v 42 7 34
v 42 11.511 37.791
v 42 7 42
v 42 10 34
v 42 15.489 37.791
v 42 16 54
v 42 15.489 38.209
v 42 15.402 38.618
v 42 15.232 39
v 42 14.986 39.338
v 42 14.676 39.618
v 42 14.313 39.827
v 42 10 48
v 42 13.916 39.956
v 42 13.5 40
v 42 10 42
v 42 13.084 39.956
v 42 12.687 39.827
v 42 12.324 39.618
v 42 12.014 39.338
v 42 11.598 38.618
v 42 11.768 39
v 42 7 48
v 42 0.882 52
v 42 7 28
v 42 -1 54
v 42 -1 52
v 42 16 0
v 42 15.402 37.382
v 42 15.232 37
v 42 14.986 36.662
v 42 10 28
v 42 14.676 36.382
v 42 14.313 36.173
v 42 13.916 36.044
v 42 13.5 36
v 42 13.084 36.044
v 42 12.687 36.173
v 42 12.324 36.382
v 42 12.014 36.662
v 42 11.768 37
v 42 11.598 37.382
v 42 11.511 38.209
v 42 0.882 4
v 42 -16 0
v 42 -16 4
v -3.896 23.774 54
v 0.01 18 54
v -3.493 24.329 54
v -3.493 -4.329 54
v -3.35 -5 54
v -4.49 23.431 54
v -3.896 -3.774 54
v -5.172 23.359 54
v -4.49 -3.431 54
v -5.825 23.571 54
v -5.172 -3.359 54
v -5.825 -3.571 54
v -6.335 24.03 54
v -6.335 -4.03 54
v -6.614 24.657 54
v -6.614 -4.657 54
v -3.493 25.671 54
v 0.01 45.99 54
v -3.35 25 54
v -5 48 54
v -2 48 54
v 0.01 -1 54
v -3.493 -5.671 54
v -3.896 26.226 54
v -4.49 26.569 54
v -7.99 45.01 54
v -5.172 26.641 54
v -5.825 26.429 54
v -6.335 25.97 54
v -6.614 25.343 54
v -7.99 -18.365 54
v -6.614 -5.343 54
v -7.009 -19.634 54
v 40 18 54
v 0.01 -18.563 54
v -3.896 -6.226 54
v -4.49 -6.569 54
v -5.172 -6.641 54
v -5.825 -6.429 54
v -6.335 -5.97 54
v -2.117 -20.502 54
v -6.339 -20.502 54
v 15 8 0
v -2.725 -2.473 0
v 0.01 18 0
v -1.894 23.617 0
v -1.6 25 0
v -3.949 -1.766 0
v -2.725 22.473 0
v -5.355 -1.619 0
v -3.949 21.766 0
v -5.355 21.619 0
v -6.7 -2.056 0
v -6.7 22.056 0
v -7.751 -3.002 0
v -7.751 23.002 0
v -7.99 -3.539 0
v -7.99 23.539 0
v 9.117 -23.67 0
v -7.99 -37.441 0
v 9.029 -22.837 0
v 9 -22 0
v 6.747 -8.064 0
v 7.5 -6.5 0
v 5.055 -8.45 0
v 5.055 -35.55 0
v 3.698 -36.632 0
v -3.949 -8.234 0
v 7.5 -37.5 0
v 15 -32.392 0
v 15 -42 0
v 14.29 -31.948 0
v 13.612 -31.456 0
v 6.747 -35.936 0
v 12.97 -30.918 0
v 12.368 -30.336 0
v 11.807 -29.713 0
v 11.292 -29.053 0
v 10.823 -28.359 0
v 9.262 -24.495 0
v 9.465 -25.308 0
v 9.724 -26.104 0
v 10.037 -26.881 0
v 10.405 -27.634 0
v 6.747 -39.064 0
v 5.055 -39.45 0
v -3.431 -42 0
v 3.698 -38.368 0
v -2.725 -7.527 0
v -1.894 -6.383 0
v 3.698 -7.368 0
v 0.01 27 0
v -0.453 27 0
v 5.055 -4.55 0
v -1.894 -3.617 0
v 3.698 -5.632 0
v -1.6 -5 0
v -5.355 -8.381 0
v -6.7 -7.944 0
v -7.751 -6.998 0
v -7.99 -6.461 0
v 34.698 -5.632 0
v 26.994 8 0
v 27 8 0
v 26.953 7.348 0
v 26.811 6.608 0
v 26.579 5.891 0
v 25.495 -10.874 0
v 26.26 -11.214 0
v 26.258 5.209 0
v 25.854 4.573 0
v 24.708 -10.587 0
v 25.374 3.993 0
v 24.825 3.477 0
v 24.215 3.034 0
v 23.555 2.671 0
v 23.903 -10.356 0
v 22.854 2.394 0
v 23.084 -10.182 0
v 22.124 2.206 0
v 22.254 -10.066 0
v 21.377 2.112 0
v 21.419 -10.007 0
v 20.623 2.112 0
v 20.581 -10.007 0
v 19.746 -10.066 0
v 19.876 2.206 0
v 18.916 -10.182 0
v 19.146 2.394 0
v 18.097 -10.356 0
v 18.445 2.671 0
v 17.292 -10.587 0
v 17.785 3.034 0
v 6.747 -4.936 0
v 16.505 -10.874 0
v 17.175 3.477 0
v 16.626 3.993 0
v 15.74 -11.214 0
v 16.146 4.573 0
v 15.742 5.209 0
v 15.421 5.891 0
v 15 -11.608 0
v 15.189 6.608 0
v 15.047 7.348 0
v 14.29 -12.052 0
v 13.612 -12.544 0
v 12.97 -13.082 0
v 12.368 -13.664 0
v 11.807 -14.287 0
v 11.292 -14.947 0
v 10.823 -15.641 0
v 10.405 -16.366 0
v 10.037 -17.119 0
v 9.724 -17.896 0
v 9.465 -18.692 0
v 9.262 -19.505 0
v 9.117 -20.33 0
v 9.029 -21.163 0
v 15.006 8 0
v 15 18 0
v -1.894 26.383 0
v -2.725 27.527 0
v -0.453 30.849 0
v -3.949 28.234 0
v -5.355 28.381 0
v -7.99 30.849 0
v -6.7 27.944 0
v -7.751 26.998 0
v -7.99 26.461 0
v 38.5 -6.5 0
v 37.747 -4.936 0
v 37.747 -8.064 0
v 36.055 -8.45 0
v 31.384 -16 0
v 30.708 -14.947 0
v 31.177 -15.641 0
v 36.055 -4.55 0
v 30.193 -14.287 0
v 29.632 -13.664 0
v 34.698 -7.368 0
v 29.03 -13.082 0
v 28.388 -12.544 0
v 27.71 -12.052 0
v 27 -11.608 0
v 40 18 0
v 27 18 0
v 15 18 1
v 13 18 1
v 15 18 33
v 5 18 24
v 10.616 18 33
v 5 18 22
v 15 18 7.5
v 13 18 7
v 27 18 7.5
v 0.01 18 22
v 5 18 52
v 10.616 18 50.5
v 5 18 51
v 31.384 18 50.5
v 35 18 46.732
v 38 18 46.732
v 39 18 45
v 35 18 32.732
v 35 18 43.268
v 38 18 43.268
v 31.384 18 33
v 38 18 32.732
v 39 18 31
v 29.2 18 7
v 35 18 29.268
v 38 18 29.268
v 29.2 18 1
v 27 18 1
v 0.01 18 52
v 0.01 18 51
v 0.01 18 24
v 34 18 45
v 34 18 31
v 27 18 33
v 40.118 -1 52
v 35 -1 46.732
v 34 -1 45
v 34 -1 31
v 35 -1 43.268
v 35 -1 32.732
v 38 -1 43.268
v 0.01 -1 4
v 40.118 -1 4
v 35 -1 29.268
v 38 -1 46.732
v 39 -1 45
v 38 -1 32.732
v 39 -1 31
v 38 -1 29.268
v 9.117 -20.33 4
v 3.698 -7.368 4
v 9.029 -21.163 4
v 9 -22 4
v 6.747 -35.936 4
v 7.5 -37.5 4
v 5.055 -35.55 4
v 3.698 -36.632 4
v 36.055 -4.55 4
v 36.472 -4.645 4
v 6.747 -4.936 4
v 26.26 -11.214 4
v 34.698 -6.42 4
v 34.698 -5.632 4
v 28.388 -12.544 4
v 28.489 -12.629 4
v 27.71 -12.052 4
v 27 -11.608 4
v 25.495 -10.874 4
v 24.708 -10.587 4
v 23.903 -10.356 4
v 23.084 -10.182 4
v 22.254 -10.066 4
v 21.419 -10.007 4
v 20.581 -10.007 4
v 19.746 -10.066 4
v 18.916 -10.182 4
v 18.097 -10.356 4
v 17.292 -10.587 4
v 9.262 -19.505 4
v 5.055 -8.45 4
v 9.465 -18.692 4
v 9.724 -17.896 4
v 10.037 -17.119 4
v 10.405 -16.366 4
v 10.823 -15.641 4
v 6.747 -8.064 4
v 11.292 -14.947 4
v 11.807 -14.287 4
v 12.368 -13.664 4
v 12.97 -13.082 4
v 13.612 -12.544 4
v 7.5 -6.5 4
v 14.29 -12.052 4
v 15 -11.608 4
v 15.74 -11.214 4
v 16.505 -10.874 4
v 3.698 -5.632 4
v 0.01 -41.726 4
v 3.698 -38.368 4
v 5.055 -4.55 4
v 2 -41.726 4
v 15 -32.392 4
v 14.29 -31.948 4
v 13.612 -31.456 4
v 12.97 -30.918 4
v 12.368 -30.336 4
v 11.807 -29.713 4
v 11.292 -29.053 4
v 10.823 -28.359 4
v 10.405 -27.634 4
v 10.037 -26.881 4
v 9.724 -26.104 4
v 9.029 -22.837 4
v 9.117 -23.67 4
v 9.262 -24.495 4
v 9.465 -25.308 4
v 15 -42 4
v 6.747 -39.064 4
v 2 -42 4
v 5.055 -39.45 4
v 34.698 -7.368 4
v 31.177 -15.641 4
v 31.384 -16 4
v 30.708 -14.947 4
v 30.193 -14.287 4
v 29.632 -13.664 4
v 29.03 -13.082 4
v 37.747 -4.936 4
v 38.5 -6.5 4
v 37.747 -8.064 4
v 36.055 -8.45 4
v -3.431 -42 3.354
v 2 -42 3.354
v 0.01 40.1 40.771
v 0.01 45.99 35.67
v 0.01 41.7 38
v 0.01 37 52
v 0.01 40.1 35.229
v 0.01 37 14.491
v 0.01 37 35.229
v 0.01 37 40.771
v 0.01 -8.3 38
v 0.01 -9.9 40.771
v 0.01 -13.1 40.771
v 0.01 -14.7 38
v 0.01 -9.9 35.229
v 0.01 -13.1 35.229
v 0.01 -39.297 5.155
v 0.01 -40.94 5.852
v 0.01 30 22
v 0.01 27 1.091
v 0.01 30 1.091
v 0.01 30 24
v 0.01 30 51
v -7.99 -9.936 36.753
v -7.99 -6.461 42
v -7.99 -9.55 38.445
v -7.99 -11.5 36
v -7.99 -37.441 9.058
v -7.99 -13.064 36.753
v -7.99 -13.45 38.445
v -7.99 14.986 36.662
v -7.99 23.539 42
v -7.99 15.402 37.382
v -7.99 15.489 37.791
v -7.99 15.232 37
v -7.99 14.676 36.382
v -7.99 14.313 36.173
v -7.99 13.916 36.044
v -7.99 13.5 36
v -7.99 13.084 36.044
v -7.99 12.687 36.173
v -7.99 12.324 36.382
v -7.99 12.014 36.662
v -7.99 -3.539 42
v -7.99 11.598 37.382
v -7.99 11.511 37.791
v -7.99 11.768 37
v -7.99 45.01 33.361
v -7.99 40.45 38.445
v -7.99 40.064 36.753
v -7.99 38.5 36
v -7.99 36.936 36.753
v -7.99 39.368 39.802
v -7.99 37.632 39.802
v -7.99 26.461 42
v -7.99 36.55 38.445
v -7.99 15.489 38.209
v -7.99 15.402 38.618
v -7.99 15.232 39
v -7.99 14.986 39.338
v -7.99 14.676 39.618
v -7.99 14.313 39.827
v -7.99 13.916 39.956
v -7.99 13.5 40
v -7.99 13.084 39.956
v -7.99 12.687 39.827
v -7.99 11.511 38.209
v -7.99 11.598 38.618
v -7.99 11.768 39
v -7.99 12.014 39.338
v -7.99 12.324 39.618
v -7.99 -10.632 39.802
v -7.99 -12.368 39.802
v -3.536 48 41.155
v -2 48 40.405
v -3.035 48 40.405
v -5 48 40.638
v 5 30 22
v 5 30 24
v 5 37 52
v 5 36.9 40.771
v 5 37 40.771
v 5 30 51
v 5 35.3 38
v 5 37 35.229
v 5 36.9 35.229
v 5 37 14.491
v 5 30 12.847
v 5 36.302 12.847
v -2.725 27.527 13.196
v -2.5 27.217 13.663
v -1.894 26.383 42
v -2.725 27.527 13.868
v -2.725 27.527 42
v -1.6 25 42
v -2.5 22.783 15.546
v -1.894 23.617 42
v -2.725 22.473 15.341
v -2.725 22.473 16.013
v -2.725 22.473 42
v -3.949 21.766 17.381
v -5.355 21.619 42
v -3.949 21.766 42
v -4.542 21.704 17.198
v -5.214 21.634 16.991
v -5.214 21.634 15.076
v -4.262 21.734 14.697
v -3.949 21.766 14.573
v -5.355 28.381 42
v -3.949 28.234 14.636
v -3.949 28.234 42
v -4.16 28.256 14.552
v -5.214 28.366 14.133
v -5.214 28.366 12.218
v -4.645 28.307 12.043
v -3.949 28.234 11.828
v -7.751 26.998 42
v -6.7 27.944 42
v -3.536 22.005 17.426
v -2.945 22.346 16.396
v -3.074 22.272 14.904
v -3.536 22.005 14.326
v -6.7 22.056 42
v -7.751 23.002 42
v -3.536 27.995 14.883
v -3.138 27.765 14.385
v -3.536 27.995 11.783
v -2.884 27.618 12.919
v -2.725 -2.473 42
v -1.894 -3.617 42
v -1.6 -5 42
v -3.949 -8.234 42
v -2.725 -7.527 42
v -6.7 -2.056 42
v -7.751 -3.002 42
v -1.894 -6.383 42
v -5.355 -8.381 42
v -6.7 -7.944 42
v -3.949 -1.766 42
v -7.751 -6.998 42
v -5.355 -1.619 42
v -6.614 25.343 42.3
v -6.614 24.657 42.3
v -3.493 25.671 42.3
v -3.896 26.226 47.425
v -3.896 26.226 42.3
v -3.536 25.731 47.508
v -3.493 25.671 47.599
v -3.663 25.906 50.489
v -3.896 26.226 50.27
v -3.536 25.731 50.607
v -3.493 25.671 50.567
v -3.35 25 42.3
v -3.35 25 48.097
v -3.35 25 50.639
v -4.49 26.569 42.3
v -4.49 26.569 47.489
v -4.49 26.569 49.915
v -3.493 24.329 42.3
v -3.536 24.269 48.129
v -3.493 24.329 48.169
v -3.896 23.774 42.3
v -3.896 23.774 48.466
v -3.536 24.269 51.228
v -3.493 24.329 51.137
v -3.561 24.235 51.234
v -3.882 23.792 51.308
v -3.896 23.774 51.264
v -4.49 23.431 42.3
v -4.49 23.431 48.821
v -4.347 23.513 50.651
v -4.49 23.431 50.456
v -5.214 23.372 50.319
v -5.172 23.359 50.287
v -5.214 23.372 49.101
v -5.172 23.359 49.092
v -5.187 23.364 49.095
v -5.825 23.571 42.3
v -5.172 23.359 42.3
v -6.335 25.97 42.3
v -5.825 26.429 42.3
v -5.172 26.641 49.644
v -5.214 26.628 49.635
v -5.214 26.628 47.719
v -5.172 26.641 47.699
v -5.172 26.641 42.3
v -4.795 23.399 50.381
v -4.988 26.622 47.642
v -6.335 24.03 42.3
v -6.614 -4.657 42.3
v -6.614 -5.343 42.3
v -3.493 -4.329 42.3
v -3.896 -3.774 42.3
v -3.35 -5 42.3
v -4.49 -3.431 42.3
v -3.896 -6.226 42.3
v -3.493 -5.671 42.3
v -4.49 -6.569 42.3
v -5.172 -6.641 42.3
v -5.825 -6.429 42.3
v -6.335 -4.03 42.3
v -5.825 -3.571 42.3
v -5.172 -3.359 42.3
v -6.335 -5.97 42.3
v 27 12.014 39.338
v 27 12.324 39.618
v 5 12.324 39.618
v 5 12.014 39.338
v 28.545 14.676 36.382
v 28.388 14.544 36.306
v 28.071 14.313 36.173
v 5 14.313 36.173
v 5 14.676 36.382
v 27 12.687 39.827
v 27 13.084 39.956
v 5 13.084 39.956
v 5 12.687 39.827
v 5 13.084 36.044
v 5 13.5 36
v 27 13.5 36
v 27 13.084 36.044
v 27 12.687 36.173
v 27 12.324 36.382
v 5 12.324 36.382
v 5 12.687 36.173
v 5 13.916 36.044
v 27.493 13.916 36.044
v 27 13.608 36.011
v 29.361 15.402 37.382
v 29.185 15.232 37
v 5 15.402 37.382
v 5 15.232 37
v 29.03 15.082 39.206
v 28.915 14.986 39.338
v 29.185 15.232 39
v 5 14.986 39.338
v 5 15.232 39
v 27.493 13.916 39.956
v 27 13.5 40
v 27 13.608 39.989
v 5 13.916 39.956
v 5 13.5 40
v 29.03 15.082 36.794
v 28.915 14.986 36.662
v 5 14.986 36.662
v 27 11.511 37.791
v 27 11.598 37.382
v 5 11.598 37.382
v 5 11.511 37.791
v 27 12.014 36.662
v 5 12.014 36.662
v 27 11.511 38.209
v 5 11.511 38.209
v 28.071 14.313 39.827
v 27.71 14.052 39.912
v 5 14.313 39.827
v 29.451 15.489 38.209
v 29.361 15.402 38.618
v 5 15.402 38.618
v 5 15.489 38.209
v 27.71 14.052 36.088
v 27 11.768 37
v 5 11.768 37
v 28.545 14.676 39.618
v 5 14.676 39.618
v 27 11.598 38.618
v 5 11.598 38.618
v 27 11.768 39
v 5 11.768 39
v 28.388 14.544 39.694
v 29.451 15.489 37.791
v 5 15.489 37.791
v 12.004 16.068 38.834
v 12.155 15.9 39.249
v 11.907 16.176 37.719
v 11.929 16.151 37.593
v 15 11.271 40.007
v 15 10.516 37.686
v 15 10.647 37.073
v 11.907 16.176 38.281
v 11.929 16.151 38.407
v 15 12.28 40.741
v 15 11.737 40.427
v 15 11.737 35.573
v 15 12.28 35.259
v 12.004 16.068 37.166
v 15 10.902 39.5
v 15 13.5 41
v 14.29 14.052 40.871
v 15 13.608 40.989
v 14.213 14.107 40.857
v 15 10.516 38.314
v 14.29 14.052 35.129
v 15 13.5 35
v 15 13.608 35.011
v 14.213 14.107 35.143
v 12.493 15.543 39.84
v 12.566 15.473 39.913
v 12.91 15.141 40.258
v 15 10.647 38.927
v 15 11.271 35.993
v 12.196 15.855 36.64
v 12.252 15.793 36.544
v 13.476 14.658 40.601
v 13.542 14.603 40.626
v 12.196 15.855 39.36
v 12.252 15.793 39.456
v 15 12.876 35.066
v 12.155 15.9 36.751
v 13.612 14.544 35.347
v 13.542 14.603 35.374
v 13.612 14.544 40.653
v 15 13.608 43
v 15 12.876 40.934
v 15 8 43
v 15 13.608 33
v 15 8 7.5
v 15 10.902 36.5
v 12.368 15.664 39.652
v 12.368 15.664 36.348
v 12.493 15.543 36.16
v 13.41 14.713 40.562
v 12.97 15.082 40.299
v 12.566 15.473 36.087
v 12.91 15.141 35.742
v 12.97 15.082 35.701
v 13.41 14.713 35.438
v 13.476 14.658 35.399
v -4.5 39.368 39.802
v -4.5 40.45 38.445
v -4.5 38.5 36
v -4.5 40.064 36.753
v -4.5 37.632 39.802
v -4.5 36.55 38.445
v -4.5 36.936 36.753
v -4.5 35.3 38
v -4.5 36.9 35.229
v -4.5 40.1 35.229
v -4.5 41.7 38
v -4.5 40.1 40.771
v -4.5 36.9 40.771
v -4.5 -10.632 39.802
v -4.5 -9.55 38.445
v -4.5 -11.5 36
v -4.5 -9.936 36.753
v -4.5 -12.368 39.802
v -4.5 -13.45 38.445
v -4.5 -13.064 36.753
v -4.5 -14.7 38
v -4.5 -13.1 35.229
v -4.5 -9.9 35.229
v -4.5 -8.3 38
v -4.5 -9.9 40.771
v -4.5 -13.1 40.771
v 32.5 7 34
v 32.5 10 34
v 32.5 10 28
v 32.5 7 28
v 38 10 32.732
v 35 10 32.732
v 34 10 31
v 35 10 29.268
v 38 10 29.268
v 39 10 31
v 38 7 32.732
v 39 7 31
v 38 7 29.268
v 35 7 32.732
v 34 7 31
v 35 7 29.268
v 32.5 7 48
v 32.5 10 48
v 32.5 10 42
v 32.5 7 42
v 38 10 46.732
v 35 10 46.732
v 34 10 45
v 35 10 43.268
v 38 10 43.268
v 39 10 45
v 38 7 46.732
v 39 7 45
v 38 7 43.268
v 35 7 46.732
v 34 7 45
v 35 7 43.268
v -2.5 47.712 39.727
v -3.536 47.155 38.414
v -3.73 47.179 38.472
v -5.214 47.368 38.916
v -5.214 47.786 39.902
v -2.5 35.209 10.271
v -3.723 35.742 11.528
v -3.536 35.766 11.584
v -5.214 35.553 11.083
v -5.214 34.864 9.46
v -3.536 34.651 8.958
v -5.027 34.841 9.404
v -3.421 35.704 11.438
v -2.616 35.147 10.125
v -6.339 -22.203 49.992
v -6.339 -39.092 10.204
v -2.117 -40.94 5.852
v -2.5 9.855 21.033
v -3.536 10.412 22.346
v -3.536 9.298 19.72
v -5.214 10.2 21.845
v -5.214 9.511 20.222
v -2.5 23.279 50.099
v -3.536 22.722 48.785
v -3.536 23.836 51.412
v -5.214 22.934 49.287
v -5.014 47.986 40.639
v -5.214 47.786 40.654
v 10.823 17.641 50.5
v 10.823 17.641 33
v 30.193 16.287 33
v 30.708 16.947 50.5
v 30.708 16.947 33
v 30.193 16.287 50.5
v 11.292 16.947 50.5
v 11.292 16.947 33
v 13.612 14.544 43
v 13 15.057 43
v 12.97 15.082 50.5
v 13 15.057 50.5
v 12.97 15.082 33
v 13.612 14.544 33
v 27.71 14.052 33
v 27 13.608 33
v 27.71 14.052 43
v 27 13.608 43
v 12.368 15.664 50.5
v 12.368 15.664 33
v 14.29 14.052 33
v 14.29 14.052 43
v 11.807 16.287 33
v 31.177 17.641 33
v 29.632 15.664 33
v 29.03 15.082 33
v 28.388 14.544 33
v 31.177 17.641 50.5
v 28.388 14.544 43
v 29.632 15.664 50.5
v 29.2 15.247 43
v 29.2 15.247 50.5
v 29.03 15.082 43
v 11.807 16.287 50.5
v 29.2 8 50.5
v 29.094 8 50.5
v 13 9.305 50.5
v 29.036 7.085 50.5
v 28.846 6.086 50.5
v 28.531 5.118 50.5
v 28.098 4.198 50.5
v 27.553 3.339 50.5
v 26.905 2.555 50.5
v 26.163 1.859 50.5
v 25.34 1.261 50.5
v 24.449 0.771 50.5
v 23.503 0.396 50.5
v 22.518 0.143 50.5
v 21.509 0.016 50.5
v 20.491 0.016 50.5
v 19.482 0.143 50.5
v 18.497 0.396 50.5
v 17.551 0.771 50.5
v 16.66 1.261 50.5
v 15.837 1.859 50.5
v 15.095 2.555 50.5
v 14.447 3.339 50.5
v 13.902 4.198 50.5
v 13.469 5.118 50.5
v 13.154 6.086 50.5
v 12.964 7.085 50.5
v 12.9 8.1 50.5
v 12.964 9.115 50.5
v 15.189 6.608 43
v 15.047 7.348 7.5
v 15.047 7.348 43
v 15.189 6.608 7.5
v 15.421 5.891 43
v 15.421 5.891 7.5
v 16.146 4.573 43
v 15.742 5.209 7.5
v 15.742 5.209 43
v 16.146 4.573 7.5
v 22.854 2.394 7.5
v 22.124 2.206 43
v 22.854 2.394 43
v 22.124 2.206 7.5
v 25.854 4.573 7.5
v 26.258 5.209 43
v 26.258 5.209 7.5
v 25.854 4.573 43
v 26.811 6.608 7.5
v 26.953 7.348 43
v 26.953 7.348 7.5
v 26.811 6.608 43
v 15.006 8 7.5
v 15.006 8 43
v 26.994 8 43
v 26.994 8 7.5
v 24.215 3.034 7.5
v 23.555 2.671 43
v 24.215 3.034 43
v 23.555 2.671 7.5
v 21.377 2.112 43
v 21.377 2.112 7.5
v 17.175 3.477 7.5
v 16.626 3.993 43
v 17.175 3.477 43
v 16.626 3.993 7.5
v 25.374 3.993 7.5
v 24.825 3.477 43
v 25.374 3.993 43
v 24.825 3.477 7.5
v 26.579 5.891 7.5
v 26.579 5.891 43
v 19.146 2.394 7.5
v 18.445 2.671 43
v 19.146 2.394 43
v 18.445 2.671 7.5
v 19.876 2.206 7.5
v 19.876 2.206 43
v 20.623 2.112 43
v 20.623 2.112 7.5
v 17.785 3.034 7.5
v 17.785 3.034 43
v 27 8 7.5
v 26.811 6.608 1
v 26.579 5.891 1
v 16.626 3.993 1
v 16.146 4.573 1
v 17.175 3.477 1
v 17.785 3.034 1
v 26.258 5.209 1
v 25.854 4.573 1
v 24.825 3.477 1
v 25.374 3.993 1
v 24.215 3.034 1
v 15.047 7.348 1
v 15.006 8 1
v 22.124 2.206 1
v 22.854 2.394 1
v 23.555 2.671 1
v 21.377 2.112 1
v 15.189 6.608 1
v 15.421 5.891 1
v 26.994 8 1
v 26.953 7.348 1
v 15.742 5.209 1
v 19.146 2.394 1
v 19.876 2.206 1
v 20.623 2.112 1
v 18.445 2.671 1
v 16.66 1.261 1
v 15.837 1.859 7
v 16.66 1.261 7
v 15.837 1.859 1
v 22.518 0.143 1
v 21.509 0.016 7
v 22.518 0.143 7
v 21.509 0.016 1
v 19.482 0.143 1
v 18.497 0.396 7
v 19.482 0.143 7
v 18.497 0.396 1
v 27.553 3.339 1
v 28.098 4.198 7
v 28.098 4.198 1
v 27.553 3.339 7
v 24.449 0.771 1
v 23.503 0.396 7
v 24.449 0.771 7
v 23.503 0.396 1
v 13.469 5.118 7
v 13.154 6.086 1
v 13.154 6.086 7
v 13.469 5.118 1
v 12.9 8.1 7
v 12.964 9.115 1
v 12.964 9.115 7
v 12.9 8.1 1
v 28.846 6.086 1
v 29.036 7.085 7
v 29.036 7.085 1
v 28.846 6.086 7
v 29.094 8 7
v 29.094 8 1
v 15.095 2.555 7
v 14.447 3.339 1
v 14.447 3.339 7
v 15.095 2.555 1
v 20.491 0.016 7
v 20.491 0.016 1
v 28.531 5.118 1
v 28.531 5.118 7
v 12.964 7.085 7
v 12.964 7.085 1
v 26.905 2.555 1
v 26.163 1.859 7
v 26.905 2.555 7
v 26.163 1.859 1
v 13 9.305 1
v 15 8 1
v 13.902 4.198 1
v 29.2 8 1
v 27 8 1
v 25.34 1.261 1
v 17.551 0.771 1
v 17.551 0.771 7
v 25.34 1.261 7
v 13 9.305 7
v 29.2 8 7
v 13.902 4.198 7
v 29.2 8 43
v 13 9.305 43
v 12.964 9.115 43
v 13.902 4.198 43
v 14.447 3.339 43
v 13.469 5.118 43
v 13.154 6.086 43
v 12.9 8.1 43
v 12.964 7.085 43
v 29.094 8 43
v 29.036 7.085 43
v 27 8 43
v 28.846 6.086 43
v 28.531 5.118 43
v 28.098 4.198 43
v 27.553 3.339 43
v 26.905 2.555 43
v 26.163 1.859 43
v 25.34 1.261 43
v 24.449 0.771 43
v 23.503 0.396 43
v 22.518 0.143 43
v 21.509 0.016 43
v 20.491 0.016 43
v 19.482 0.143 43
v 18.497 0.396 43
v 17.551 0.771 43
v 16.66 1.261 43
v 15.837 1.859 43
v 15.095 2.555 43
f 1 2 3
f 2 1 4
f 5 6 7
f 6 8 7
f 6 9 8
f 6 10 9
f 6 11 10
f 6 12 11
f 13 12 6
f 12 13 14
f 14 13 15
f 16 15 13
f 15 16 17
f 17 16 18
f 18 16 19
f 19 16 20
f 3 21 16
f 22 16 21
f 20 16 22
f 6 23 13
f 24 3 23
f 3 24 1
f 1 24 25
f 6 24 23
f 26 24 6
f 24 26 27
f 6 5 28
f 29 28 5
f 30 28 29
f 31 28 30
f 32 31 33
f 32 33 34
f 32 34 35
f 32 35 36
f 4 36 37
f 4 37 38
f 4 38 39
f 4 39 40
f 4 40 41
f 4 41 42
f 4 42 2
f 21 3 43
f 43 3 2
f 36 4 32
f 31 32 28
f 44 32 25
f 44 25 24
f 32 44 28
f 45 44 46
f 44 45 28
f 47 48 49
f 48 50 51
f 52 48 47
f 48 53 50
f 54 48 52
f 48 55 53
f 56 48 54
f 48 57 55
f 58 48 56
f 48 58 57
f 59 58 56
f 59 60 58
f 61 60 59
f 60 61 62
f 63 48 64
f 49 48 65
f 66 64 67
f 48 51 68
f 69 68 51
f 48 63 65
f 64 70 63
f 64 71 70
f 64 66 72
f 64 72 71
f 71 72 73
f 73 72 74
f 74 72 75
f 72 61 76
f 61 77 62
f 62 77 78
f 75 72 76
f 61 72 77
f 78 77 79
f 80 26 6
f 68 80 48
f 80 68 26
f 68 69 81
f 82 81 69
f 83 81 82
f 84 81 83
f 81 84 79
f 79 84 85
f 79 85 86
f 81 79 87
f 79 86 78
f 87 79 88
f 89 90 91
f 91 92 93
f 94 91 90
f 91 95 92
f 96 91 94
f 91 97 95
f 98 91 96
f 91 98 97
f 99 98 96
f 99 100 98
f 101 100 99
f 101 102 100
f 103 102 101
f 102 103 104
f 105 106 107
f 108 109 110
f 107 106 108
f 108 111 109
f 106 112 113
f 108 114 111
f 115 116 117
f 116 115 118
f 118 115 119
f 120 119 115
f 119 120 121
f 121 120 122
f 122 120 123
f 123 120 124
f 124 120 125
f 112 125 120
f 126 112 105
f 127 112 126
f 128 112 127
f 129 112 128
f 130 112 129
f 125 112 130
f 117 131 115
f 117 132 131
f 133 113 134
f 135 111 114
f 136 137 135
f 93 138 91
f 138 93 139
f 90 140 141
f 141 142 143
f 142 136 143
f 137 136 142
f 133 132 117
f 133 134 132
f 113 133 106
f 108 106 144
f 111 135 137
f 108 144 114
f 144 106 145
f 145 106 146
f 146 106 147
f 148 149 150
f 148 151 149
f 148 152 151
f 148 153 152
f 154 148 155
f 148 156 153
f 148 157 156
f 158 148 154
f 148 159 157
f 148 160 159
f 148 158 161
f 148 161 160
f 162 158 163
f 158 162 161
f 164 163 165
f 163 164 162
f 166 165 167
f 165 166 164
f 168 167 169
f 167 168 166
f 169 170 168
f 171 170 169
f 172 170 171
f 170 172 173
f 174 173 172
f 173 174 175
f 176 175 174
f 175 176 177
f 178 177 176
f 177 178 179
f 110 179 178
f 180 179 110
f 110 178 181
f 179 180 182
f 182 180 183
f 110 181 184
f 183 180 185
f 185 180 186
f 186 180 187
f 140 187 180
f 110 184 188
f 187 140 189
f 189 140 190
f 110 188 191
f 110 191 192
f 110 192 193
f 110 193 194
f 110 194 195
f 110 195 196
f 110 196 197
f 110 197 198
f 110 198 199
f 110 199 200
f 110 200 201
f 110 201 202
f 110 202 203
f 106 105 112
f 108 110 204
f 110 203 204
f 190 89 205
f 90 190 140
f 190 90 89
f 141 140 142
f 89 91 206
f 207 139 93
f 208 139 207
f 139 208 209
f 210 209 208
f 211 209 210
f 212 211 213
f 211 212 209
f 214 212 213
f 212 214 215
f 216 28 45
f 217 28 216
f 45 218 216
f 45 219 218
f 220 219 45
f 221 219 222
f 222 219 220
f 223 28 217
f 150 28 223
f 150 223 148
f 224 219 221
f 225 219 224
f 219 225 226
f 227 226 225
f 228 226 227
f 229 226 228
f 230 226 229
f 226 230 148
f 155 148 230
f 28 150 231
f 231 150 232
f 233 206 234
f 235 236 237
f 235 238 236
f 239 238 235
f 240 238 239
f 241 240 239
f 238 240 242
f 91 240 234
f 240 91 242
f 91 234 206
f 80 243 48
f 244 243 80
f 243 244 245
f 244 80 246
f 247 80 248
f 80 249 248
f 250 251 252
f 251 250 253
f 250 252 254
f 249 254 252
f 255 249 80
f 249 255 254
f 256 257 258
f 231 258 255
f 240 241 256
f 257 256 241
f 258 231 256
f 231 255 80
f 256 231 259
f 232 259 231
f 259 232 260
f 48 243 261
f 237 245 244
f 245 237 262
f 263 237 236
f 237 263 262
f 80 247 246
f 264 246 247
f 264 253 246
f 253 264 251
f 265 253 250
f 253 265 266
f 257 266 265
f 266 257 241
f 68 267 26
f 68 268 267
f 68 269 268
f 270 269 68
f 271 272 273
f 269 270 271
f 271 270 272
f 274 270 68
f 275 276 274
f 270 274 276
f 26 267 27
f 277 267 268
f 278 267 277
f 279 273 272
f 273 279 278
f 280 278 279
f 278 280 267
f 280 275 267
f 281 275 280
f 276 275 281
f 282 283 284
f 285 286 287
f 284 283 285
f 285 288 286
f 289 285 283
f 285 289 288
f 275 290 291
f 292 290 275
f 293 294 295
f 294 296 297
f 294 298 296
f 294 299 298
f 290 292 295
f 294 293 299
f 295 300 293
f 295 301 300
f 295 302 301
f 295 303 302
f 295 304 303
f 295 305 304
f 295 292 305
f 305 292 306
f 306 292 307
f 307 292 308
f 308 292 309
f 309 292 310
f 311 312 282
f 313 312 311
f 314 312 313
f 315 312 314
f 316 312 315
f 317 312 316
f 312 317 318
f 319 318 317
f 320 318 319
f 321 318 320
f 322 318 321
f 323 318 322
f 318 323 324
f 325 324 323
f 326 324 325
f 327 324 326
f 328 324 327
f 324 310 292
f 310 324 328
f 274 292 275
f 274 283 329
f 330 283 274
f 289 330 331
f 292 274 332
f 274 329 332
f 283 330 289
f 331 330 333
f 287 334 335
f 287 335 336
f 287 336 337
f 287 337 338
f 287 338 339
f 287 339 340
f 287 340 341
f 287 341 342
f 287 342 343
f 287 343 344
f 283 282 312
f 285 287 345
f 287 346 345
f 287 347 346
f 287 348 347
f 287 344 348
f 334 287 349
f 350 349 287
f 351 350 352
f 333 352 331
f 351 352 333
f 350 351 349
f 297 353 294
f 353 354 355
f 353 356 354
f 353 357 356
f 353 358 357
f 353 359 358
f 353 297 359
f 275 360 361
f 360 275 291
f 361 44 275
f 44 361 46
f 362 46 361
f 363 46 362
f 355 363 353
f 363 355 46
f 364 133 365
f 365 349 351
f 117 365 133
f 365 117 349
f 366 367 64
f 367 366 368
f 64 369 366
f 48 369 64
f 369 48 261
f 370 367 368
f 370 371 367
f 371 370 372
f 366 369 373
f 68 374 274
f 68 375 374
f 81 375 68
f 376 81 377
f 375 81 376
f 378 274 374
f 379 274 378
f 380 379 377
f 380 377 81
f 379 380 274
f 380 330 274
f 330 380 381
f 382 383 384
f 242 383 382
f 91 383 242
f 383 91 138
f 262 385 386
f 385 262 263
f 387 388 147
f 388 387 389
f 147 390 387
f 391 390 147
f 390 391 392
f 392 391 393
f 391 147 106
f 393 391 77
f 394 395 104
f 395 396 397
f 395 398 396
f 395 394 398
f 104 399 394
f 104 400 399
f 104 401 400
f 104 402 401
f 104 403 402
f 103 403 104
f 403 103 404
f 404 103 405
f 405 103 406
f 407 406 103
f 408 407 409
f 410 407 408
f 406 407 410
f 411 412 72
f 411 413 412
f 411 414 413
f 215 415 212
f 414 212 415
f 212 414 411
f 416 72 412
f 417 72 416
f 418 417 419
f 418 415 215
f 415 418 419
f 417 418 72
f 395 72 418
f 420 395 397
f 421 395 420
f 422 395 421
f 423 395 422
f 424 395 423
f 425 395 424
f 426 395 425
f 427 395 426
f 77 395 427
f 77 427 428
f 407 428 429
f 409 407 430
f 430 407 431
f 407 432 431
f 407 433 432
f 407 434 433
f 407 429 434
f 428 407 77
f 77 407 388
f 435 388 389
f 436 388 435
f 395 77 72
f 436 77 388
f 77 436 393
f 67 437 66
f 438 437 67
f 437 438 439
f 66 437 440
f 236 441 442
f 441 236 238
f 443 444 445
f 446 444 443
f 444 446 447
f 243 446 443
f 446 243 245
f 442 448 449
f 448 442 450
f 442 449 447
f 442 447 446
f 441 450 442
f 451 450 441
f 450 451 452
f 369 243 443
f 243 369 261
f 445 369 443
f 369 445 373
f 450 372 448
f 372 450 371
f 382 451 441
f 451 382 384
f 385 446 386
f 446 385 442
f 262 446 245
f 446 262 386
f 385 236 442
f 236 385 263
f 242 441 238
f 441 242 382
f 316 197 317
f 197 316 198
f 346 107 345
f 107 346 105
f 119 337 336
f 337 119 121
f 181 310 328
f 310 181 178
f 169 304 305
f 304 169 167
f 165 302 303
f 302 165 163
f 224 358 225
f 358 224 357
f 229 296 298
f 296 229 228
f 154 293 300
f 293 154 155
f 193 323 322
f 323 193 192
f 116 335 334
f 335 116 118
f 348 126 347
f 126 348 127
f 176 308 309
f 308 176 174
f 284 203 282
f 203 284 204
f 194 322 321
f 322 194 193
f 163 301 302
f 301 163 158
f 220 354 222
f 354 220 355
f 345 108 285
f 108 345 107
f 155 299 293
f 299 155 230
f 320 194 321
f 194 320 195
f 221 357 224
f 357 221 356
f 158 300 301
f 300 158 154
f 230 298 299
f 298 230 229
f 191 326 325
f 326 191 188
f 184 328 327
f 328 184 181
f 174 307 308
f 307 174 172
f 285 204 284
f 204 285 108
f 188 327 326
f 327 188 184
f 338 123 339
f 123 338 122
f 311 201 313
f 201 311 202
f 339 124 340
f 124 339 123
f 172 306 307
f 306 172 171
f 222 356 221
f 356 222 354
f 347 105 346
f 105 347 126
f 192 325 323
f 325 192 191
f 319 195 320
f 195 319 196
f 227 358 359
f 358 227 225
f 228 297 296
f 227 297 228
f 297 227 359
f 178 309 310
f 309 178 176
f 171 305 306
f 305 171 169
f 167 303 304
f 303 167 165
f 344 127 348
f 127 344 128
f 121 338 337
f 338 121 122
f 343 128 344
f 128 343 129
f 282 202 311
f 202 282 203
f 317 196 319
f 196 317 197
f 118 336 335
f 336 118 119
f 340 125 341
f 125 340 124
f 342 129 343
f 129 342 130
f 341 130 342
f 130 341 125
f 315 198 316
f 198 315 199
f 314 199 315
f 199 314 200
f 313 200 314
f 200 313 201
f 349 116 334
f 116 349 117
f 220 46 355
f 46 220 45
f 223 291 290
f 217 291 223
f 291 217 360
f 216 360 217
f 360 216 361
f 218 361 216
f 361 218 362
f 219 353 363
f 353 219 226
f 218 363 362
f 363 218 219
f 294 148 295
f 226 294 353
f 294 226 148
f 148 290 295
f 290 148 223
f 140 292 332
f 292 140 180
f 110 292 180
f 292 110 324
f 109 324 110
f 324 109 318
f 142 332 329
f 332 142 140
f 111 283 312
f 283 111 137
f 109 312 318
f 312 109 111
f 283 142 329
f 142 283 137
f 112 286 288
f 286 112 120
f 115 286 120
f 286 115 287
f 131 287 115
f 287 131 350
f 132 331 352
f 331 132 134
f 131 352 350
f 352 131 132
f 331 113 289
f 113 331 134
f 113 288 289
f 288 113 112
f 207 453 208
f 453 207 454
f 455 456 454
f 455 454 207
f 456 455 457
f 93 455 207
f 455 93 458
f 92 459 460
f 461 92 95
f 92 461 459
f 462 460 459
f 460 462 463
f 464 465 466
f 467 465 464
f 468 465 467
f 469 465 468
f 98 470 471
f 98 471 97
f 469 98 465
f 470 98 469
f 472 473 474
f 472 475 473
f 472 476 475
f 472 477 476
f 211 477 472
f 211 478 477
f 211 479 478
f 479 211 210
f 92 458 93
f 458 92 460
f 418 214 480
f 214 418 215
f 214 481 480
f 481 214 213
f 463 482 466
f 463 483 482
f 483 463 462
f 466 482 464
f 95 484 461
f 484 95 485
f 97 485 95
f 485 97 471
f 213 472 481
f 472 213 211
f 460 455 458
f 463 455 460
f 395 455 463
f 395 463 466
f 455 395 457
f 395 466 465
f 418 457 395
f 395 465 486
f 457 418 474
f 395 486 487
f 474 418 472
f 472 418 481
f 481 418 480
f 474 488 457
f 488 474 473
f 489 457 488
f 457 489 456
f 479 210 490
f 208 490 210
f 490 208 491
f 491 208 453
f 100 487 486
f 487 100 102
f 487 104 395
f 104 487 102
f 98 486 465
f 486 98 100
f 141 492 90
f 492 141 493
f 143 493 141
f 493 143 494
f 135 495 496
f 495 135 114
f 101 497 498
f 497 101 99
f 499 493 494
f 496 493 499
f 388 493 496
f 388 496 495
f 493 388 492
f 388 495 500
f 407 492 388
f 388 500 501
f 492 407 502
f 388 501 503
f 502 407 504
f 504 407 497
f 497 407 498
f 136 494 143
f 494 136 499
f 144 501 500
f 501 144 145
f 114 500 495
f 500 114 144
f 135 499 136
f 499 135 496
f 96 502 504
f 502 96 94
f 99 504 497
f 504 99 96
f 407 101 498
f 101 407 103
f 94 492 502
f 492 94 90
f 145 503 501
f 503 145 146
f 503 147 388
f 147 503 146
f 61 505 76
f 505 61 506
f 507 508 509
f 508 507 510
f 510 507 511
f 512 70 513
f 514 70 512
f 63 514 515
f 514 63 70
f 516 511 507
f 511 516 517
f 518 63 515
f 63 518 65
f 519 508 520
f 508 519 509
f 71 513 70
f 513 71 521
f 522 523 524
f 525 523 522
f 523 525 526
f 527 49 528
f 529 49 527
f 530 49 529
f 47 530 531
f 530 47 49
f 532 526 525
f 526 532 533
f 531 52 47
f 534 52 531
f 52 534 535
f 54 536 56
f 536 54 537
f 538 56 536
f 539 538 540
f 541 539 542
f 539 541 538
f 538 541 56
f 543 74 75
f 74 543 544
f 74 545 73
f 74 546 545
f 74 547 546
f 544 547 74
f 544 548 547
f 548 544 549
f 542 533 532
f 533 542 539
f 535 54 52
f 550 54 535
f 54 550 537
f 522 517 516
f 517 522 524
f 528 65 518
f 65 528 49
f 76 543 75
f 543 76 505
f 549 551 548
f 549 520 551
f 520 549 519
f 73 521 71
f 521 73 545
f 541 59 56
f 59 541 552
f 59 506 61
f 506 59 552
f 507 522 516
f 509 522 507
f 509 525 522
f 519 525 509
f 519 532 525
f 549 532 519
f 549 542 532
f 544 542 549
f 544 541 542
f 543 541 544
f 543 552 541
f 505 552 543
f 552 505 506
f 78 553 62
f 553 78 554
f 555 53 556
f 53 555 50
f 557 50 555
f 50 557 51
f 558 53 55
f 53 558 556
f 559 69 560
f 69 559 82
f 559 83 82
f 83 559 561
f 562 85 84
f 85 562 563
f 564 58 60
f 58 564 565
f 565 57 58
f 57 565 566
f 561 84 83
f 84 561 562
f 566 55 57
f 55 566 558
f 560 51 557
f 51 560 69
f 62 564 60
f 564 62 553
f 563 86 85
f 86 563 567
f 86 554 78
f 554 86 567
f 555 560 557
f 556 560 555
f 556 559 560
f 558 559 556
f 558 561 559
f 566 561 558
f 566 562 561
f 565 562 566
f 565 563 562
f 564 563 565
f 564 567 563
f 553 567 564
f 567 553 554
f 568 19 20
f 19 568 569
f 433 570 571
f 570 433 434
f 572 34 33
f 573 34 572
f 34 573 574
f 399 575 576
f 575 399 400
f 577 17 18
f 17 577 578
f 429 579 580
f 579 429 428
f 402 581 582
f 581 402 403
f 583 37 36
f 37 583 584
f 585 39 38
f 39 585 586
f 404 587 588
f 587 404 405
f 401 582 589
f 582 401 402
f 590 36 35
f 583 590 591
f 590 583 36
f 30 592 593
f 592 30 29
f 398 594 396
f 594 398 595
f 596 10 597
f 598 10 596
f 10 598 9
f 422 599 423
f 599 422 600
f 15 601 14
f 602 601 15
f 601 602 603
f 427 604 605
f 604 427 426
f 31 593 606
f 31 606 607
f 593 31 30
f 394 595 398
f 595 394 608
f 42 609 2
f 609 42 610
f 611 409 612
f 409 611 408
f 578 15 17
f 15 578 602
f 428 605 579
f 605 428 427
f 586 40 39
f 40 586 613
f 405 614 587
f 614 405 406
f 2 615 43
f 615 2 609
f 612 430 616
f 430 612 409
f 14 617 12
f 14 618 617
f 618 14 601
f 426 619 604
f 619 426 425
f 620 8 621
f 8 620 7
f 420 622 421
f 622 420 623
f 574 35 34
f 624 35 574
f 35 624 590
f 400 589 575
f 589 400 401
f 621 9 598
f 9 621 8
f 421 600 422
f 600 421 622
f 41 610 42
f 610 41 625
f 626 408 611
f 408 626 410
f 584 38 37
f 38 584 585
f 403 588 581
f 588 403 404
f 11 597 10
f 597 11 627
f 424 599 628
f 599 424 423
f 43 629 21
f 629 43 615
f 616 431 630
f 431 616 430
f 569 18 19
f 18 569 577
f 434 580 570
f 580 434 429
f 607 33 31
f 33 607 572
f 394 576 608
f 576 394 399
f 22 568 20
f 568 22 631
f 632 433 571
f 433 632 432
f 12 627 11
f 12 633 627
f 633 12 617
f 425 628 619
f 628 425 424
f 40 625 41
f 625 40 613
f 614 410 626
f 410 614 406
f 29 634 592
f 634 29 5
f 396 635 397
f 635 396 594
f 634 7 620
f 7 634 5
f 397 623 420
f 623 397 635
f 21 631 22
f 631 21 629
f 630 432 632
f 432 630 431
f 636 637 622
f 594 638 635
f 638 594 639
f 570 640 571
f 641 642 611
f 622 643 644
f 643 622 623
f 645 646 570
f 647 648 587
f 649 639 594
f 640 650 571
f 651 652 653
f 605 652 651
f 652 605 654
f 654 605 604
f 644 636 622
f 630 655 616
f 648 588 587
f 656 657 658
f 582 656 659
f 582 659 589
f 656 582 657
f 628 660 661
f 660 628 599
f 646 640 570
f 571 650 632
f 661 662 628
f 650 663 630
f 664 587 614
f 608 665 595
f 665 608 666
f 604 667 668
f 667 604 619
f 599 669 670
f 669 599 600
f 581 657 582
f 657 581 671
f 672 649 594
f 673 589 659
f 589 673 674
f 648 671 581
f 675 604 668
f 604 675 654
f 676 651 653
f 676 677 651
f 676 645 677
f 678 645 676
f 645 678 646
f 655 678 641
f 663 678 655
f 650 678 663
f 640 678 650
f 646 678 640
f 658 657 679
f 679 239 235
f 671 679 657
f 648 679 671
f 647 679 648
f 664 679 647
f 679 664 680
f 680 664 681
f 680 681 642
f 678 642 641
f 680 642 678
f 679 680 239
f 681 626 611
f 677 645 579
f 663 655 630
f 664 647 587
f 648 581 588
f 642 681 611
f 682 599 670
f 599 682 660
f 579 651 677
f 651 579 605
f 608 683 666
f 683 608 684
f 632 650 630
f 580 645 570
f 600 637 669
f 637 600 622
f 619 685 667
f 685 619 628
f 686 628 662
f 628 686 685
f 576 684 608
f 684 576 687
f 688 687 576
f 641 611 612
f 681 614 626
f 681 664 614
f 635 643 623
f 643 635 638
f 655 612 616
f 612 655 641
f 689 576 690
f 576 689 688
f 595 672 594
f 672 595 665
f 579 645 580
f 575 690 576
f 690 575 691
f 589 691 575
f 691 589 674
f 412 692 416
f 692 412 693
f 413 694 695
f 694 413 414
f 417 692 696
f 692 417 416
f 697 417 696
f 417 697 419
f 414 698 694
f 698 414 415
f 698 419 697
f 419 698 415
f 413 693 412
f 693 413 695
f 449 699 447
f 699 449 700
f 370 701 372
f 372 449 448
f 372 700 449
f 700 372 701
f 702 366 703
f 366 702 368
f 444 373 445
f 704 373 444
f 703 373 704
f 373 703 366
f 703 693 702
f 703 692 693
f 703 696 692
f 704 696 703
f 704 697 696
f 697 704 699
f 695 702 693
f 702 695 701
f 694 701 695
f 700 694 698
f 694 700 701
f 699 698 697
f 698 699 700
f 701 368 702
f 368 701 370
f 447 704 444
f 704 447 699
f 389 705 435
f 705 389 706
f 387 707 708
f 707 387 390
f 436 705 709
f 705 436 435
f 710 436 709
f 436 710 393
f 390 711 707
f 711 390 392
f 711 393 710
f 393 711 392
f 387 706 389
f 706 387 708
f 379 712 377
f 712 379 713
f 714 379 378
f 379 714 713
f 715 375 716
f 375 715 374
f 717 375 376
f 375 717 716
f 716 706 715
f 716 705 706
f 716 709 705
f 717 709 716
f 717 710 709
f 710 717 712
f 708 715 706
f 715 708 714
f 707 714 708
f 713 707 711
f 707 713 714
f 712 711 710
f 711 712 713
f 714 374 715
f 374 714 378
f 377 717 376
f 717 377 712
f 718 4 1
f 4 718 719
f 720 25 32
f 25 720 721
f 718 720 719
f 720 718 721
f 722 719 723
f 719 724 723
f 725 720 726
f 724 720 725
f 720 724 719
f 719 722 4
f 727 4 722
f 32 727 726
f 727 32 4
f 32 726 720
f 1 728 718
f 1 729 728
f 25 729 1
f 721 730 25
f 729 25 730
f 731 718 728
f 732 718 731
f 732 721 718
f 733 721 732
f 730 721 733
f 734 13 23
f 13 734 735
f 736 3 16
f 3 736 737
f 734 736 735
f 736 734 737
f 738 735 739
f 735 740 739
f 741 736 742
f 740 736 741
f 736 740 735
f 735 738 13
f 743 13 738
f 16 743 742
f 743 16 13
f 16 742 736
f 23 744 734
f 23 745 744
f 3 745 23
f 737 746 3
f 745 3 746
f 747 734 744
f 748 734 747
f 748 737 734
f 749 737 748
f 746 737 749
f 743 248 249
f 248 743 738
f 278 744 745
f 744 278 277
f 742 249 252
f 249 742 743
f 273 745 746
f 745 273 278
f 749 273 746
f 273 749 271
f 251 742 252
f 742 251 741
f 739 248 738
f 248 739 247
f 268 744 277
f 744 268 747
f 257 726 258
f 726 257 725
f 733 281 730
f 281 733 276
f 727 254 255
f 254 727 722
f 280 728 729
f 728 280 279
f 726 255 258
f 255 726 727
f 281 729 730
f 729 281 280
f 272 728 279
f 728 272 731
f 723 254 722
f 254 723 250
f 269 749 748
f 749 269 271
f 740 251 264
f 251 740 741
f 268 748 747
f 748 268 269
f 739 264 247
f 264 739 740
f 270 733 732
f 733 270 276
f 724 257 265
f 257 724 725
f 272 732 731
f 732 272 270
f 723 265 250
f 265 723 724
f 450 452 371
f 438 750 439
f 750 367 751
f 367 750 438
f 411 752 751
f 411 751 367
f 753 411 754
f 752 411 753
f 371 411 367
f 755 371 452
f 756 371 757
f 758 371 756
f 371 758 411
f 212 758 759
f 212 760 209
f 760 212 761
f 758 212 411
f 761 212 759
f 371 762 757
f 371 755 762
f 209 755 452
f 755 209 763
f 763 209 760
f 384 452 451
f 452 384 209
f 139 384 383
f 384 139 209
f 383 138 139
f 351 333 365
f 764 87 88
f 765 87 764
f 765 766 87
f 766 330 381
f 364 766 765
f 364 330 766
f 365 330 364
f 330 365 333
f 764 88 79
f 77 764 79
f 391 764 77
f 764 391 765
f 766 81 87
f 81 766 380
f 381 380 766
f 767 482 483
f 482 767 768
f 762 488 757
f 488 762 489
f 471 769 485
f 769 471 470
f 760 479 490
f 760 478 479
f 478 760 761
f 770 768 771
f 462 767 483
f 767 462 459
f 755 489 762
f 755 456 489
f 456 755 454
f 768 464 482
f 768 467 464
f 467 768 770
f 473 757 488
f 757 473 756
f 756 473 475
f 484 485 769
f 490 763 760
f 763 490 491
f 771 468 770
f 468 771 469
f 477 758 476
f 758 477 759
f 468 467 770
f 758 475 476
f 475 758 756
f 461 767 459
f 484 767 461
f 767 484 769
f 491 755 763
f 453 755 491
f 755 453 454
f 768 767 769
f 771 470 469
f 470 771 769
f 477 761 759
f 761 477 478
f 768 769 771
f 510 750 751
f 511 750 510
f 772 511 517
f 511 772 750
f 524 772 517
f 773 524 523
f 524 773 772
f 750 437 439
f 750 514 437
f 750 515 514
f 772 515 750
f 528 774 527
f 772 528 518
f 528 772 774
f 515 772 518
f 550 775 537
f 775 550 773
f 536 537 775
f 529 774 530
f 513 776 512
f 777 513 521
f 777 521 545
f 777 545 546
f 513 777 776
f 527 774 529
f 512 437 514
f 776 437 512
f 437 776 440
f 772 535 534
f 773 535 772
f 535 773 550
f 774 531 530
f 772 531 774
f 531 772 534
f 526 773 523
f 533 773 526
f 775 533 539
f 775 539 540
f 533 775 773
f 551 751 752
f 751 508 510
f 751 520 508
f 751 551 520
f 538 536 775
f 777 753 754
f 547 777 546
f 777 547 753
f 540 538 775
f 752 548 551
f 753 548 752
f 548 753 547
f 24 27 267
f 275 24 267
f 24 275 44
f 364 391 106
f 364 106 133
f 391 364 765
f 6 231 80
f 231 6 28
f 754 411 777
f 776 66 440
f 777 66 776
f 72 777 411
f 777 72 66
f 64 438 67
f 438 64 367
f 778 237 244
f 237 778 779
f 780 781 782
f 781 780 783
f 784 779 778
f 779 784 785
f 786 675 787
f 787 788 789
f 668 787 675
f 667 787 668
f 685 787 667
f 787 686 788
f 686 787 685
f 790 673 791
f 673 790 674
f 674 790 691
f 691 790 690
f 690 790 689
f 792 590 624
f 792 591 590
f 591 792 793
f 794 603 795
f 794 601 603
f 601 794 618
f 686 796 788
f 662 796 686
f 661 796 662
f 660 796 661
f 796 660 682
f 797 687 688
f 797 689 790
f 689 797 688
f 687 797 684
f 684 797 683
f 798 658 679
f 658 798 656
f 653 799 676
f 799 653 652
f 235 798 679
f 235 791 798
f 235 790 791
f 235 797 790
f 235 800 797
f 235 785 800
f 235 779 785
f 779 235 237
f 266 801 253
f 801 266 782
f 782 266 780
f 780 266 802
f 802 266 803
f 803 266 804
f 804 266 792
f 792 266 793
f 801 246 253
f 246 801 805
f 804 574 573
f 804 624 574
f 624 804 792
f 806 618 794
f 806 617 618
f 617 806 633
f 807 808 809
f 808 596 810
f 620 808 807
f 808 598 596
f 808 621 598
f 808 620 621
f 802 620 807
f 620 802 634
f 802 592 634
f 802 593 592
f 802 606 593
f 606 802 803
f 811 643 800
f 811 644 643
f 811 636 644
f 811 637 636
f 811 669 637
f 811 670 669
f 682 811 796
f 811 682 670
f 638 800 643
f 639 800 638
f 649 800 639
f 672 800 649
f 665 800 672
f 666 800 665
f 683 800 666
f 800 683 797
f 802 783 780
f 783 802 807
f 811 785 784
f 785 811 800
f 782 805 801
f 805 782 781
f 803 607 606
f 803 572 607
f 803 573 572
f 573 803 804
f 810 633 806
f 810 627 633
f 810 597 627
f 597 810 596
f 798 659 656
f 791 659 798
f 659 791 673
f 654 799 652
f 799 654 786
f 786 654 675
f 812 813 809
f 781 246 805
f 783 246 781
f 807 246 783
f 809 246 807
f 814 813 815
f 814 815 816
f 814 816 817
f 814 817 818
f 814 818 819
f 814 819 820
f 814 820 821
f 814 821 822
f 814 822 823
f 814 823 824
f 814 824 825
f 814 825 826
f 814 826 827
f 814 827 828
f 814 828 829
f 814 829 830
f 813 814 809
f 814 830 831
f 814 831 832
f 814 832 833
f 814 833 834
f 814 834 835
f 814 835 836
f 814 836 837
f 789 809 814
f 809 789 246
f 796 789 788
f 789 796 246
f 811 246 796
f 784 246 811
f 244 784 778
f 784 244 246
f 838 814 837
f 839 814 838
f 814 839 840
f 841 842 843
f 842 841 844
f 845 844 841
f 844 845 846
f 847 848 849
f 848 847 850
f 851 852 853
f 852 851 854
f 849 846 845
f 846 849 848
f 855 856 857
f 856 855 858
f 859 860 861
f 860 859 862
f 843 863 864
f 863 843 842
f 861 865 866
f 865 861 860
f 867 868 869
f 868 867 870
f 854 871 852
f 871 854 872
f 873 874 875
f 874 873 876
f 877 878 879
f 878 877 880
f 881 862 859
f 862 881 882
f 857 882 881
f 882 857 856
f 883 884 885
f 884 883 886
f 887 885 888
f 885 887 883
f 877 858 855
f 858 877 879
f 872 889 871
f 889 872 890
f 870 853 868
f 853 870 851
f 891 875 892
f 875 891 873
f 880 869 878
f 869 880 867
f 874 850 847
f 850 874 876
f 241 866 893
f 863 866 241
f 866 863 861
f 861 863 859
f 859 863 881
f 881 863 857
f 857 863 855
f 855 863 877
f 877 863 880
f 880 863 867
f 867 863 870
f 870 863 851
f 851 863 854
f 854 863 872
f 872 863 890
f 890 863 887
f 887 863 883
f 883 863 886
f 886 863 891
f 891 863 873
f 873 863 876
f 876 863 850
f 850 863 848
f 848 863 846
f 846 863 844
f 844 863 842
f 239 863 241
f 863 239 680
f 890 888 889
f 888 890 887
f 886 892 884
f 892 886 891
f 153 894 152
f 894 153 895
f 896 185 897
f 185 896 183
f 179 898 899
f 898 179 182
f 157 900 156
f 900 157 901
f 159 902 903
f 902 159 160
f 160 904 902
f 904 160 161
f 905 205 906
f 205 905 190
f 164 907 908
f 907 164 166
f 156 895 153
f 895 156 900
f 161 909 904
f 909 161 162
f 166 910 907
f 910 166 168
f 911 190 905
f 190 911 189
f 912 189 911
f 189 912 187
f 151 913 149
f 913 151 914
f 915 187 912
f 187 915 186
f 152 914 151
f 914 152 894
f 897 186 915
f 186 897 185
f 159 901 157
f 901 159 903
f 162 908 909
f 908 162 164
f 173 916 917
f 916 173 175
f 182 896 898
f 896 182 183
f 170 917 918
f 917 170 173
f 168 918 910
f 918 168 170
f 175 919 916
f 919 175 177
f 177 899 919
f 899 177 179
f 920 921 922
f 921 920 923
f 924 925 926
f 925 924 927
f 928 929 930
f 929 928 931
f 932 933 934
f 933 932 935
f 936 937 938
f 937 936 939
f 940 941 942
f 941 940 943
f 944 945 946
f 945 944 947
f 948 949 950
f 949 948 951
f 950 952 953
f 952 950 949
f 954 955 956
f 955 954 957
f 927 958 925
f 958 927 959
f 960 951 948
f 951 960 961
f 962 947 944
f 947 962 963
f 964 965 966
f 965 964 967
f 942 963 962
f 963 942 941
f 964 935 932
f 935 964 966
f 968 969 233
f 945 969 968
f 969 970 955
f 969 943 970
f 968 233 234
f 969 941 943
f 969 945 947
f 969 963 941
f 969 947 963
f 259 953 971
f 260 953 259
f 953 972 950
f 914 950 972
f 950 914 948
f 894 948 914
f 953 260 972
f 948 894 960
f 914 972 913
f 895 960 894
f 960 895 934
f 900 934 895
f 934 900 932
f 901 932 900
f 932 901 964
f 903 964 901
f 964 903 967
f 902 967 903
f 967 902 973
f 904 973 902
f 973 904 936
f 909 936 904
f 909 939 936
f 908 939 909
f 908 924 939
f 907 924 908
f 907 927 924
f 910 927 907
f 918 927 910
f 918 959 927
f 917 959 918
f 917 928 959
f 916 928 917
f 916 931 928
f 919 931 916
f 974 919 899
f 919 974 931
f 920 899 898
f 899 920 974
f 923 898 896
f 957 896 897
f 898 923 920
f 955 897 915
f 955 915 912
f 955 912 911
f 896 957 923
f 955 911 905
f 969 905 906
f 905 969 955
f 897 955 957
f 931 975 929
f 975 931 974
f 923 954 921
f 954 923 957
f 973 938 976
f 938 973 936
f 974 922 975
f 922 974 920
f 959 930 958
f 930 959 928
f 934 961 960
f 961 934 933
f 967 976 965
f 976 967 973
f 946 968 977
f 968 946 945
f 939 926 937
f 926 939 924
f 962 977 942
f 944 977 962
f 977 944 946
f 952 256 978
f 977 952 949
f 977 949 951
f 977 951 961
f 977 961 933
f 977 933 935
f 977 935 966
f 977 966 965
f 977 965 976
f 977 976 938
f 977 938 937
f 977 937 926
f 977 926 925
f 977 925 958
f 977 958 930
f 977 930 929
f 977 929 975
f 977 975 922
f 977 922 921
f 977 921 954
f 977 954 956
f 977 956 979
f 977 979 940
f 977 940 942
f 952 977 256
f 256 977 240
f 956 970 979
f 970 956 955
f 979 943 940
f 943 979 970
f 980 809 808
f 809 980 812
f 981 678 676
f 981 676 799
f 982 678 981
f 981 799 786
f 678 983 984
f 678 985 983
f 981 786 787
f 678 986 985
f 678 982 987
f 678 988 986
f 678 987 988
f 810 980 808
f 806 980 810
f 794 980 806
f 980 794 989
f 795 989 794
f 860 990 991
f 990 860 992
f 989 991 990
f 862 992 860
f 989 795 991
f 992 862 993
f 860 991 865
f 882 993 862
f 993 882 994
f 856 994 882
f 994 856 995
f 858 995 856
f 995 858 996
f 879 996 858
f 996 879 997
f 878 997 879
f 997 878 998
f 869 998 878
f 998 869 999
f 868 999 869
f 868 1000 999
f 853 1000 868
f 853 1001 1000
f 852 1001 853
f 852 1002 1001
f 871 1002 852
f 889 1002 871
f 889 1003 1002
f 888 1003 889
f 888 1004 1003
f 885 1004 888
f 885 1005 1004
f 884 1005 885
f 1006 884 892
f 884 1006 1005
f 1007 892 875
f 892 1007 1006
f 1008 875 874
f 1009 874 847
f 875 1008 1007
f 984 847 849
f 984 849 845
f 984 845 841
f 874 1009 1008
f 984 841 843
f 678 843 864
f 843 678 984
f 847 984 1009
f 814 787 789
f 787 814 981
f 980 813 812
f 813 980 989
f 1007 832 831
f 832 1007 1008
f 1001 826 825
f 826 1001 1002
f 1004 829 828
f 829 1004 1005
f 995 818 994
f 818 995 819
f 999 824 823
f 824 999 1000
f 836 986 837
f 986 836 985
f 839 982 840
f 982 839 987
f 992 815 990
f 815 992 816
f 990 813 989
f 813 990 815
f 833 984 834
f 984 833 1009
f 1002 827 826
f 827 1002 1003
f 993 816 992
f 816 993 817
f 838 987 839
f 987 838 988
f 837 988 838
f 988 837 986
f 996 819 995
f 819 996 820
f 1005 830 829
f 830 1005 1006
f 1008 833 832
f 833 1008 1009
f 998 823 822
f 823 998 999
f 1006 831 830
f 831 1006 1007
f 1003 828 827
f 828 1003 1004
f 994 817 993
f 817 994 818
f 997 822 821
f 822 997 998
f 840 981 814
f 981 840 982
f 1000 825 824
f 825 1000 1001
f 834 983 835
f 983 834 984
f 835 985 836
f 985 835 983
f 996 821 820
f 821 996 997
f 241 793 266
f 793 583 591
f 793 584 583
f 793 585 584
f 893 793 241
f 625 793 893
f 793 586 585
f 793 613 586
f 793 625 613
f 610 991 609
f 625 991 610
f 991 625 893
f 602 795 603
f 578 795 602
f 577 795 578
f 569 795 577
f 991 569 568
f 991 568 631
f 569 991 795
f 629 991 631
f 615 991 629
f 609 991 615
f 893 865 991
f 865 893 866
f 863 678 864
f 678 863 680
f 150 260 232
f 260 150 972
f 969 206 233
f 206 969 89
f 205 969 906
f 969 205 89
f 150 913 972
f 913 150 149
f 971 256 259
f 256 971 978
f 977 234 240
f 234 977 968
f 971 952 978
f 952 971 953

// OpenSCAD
// PRUSA iteration3
// NEMA 17 extruder body
// GNU GPL v3
// Josef Průša <iam@josefprusa.cz>, Kliment Yanev and contributors
// http://www.reprap.org/wiki/Prusa_Mendel
// http://prusamendel.org

// offset de los taladros de sujeción
m=5;
// distancia entre taladros de sujeción
support=30;

module nozzlemount(){
rotate([0,90,0]) cylinder(r=2, h=70, $fn=30);
translate([17,0,0]) rotate([0,90,0]) cylinder(r2=3,r1=2, h=10, $fn=30);
translate([1,0,0]) rotate([0,90,0]) cylinder(r1=4, r2=2, h=3);

translate([0,15+10,0]) rotate([0,90,0]) cylinder(r=2, h=70);
translate([10-2.5,15+10,0]) rotate([0,90,0]) rotate([0,0,30]) cylinder(r=3.2, h=70,$fn=6);
translate([0,-25,0]) rotate([0,90,0]) cylinder(r=2, h=70);
translate([10-2.5,-25,0]) rotate([0,90,0]) rotate([0,0,30])cylinder(r=3.2, h=70,$fn=6);
}


difference(){
union(){
translate([0,-1,0]) cube([42,19,54]);
translate([0,-42,0]) cube([42,42+3,4]);
translate([-7.99,-42,0]) cube([8,80+10,54]);

translate([-1,30,0]) cube([6, 7, 52]);


translate([-1,15,51]) cube([6, 20, 1]);
translate([-1,15,22]) cube([6, 20, 2]);

}

//antiwarpagenation

translate([46,-91+28,4])rotate([0,0,45]) cube(48);
translate([-11,-91,-1])rotate([0,0,45])  cube([40,40,60]);
translate([46,12,-1])rotate([0,0,45])  cube([40,40,60]);
translate([-32,12+9,-1])rotate([0,0,45]) cube([40,40,60]);
translate([6,31+9,-1])rotate([0,0,45]) cube([40,40,60]);



// motor circle cut
translate([0,-1,0.5]){
translate([21,-21,-1]) cylinder(r=12, h=5, $fn=90);

 translate([15,-45,-1]) cube([30,30,5]);

translate([21+15.5,-21+15.5,-1]) cylinder(r=2, h=5);
translate([21+15.5,-21-15.5,-1]) cylinder(r=2, h=5);
translate([21-15.5,-21+15.5,-1]) cylinder(r=2, h=5);
translate([21-15.5,-21-15.5,-1]) cylinder(r=2, h=5);
}



// idler bearing cutout

translate([21,24,33]) cylinder(r=12, h=17.5, $fn=90);



translate([21,8.1,7.5]) cylinder(r=6, h=43, $fn=50);

translate([21,8.1,-1]) cylinder(r=6, h=3, $fn=50);
// Second filament drive bearing
translate([21,8.1,1]) cylinder(r=8.1, h=6, $fn=50);
// Second filament drive bearing insert cutout

translate([13,8,43]) cube([16.2,20,7.5]);


translate([21,8.1,-5+52-4]) cylinder(r=8.1, h=7.5, $fn=50);
translate([-6+21,8,7.5]) cube([12,12,40]);

translate([-6+21,8,-50+7]) cube([12,12,50]);


translate([13,8,1]) cube([16.2,20,6]);

//mounting to carriage
translate([-5,20,-28]){
translate([0,0+m ,0])rotate([0,0,0])cylinder(r=3.4, h=70, $fn=15);
translate([0,0-support+m ,0])rotate([0,0,0])cylinder(r=3.4, h=70, $fn=15);
// make a layer for the holes
translate([0,0+m ,70+0.3]) rotate([0,0,0]) cylinder(r=3.3/2, h=12, $fn=15);
translate([0,0-support+m  ,70.3])rotate([0,0,0])cylinder(r=3.3/2, h=12, $fn=15);
}

// idler nuts and filament channels

translate([0,0,-2]){
translate([-12,2+8+3.5,52-12]) nozzlemount();
//translate([-10,2+8+4,52-12-25]) nozzlemount();

translate([32.5,7,52-12-7-3]) cube([15,3,6]);

translate([32.5,7,52-12-7-3+14]) cube([15,3,6]);


//translate([5+32,-1,52-12+7]) rotate([0,90,90]) rotate([0,0,30]) cylinder(r=3.3, h=10, $fn=6);
//translate([5+32,-1,52-12-7]) rotate([0,90,90]) rotate([0,0,30]) cylinder(r=3.3, h=10, $fn=6);



translate([5+32,-1,52-12+7]) rotate([0,90,90]) rotate([0,0,30]) cylinder(r=2, h=40, $fn=6);
translate([5+32,-1,52-12-7]) rotate([0,90,90]) rotate([0,0,30]) cylinder(r=2, h=40, $fn=6);
translate([5+31,-1,52-12+7]) rotate([0,90,90]) rotate([0,0,30]) cylinder(r=2, h=40, $fn=6);
translate([5+31,-1,52-12-7]) rotate([0,90,90]) rotate([0,0,30]) cylinder(r=2, h=40, $fn=6);


// pretty cutout
translate([-10,27+3,0]) rotate([-23,0,0]) cube([20,12+20,50+10]);
translate([-3,27,6-10]) rotate([0,23,0]) cube([20,12,50]);

// pretty cutout
translate([-10,-66,0]) rotate([-23,0,0])  cube([12,20,90]);
// new pretty
translate([-10+3,-66+4,14-10]) rotate([-23,0,0]) rotate([0,0,40]) cube([12,20,90]);
translate([10,-66+20,10]) rotate([-23,0,0]) rotate([0,0,40+90]) cube([12,20,90]);

//fan holes
translate([-4,28+10,10]) rotate([90-23,0,0])  translate([0,1,0]) cylinder(r=3/2,h=31);
translate([-4,28+10,10]) rotate([90-23,0,0])  translate([0,1+32,0]) cylinder(r=3/2,h=30);


}
}
